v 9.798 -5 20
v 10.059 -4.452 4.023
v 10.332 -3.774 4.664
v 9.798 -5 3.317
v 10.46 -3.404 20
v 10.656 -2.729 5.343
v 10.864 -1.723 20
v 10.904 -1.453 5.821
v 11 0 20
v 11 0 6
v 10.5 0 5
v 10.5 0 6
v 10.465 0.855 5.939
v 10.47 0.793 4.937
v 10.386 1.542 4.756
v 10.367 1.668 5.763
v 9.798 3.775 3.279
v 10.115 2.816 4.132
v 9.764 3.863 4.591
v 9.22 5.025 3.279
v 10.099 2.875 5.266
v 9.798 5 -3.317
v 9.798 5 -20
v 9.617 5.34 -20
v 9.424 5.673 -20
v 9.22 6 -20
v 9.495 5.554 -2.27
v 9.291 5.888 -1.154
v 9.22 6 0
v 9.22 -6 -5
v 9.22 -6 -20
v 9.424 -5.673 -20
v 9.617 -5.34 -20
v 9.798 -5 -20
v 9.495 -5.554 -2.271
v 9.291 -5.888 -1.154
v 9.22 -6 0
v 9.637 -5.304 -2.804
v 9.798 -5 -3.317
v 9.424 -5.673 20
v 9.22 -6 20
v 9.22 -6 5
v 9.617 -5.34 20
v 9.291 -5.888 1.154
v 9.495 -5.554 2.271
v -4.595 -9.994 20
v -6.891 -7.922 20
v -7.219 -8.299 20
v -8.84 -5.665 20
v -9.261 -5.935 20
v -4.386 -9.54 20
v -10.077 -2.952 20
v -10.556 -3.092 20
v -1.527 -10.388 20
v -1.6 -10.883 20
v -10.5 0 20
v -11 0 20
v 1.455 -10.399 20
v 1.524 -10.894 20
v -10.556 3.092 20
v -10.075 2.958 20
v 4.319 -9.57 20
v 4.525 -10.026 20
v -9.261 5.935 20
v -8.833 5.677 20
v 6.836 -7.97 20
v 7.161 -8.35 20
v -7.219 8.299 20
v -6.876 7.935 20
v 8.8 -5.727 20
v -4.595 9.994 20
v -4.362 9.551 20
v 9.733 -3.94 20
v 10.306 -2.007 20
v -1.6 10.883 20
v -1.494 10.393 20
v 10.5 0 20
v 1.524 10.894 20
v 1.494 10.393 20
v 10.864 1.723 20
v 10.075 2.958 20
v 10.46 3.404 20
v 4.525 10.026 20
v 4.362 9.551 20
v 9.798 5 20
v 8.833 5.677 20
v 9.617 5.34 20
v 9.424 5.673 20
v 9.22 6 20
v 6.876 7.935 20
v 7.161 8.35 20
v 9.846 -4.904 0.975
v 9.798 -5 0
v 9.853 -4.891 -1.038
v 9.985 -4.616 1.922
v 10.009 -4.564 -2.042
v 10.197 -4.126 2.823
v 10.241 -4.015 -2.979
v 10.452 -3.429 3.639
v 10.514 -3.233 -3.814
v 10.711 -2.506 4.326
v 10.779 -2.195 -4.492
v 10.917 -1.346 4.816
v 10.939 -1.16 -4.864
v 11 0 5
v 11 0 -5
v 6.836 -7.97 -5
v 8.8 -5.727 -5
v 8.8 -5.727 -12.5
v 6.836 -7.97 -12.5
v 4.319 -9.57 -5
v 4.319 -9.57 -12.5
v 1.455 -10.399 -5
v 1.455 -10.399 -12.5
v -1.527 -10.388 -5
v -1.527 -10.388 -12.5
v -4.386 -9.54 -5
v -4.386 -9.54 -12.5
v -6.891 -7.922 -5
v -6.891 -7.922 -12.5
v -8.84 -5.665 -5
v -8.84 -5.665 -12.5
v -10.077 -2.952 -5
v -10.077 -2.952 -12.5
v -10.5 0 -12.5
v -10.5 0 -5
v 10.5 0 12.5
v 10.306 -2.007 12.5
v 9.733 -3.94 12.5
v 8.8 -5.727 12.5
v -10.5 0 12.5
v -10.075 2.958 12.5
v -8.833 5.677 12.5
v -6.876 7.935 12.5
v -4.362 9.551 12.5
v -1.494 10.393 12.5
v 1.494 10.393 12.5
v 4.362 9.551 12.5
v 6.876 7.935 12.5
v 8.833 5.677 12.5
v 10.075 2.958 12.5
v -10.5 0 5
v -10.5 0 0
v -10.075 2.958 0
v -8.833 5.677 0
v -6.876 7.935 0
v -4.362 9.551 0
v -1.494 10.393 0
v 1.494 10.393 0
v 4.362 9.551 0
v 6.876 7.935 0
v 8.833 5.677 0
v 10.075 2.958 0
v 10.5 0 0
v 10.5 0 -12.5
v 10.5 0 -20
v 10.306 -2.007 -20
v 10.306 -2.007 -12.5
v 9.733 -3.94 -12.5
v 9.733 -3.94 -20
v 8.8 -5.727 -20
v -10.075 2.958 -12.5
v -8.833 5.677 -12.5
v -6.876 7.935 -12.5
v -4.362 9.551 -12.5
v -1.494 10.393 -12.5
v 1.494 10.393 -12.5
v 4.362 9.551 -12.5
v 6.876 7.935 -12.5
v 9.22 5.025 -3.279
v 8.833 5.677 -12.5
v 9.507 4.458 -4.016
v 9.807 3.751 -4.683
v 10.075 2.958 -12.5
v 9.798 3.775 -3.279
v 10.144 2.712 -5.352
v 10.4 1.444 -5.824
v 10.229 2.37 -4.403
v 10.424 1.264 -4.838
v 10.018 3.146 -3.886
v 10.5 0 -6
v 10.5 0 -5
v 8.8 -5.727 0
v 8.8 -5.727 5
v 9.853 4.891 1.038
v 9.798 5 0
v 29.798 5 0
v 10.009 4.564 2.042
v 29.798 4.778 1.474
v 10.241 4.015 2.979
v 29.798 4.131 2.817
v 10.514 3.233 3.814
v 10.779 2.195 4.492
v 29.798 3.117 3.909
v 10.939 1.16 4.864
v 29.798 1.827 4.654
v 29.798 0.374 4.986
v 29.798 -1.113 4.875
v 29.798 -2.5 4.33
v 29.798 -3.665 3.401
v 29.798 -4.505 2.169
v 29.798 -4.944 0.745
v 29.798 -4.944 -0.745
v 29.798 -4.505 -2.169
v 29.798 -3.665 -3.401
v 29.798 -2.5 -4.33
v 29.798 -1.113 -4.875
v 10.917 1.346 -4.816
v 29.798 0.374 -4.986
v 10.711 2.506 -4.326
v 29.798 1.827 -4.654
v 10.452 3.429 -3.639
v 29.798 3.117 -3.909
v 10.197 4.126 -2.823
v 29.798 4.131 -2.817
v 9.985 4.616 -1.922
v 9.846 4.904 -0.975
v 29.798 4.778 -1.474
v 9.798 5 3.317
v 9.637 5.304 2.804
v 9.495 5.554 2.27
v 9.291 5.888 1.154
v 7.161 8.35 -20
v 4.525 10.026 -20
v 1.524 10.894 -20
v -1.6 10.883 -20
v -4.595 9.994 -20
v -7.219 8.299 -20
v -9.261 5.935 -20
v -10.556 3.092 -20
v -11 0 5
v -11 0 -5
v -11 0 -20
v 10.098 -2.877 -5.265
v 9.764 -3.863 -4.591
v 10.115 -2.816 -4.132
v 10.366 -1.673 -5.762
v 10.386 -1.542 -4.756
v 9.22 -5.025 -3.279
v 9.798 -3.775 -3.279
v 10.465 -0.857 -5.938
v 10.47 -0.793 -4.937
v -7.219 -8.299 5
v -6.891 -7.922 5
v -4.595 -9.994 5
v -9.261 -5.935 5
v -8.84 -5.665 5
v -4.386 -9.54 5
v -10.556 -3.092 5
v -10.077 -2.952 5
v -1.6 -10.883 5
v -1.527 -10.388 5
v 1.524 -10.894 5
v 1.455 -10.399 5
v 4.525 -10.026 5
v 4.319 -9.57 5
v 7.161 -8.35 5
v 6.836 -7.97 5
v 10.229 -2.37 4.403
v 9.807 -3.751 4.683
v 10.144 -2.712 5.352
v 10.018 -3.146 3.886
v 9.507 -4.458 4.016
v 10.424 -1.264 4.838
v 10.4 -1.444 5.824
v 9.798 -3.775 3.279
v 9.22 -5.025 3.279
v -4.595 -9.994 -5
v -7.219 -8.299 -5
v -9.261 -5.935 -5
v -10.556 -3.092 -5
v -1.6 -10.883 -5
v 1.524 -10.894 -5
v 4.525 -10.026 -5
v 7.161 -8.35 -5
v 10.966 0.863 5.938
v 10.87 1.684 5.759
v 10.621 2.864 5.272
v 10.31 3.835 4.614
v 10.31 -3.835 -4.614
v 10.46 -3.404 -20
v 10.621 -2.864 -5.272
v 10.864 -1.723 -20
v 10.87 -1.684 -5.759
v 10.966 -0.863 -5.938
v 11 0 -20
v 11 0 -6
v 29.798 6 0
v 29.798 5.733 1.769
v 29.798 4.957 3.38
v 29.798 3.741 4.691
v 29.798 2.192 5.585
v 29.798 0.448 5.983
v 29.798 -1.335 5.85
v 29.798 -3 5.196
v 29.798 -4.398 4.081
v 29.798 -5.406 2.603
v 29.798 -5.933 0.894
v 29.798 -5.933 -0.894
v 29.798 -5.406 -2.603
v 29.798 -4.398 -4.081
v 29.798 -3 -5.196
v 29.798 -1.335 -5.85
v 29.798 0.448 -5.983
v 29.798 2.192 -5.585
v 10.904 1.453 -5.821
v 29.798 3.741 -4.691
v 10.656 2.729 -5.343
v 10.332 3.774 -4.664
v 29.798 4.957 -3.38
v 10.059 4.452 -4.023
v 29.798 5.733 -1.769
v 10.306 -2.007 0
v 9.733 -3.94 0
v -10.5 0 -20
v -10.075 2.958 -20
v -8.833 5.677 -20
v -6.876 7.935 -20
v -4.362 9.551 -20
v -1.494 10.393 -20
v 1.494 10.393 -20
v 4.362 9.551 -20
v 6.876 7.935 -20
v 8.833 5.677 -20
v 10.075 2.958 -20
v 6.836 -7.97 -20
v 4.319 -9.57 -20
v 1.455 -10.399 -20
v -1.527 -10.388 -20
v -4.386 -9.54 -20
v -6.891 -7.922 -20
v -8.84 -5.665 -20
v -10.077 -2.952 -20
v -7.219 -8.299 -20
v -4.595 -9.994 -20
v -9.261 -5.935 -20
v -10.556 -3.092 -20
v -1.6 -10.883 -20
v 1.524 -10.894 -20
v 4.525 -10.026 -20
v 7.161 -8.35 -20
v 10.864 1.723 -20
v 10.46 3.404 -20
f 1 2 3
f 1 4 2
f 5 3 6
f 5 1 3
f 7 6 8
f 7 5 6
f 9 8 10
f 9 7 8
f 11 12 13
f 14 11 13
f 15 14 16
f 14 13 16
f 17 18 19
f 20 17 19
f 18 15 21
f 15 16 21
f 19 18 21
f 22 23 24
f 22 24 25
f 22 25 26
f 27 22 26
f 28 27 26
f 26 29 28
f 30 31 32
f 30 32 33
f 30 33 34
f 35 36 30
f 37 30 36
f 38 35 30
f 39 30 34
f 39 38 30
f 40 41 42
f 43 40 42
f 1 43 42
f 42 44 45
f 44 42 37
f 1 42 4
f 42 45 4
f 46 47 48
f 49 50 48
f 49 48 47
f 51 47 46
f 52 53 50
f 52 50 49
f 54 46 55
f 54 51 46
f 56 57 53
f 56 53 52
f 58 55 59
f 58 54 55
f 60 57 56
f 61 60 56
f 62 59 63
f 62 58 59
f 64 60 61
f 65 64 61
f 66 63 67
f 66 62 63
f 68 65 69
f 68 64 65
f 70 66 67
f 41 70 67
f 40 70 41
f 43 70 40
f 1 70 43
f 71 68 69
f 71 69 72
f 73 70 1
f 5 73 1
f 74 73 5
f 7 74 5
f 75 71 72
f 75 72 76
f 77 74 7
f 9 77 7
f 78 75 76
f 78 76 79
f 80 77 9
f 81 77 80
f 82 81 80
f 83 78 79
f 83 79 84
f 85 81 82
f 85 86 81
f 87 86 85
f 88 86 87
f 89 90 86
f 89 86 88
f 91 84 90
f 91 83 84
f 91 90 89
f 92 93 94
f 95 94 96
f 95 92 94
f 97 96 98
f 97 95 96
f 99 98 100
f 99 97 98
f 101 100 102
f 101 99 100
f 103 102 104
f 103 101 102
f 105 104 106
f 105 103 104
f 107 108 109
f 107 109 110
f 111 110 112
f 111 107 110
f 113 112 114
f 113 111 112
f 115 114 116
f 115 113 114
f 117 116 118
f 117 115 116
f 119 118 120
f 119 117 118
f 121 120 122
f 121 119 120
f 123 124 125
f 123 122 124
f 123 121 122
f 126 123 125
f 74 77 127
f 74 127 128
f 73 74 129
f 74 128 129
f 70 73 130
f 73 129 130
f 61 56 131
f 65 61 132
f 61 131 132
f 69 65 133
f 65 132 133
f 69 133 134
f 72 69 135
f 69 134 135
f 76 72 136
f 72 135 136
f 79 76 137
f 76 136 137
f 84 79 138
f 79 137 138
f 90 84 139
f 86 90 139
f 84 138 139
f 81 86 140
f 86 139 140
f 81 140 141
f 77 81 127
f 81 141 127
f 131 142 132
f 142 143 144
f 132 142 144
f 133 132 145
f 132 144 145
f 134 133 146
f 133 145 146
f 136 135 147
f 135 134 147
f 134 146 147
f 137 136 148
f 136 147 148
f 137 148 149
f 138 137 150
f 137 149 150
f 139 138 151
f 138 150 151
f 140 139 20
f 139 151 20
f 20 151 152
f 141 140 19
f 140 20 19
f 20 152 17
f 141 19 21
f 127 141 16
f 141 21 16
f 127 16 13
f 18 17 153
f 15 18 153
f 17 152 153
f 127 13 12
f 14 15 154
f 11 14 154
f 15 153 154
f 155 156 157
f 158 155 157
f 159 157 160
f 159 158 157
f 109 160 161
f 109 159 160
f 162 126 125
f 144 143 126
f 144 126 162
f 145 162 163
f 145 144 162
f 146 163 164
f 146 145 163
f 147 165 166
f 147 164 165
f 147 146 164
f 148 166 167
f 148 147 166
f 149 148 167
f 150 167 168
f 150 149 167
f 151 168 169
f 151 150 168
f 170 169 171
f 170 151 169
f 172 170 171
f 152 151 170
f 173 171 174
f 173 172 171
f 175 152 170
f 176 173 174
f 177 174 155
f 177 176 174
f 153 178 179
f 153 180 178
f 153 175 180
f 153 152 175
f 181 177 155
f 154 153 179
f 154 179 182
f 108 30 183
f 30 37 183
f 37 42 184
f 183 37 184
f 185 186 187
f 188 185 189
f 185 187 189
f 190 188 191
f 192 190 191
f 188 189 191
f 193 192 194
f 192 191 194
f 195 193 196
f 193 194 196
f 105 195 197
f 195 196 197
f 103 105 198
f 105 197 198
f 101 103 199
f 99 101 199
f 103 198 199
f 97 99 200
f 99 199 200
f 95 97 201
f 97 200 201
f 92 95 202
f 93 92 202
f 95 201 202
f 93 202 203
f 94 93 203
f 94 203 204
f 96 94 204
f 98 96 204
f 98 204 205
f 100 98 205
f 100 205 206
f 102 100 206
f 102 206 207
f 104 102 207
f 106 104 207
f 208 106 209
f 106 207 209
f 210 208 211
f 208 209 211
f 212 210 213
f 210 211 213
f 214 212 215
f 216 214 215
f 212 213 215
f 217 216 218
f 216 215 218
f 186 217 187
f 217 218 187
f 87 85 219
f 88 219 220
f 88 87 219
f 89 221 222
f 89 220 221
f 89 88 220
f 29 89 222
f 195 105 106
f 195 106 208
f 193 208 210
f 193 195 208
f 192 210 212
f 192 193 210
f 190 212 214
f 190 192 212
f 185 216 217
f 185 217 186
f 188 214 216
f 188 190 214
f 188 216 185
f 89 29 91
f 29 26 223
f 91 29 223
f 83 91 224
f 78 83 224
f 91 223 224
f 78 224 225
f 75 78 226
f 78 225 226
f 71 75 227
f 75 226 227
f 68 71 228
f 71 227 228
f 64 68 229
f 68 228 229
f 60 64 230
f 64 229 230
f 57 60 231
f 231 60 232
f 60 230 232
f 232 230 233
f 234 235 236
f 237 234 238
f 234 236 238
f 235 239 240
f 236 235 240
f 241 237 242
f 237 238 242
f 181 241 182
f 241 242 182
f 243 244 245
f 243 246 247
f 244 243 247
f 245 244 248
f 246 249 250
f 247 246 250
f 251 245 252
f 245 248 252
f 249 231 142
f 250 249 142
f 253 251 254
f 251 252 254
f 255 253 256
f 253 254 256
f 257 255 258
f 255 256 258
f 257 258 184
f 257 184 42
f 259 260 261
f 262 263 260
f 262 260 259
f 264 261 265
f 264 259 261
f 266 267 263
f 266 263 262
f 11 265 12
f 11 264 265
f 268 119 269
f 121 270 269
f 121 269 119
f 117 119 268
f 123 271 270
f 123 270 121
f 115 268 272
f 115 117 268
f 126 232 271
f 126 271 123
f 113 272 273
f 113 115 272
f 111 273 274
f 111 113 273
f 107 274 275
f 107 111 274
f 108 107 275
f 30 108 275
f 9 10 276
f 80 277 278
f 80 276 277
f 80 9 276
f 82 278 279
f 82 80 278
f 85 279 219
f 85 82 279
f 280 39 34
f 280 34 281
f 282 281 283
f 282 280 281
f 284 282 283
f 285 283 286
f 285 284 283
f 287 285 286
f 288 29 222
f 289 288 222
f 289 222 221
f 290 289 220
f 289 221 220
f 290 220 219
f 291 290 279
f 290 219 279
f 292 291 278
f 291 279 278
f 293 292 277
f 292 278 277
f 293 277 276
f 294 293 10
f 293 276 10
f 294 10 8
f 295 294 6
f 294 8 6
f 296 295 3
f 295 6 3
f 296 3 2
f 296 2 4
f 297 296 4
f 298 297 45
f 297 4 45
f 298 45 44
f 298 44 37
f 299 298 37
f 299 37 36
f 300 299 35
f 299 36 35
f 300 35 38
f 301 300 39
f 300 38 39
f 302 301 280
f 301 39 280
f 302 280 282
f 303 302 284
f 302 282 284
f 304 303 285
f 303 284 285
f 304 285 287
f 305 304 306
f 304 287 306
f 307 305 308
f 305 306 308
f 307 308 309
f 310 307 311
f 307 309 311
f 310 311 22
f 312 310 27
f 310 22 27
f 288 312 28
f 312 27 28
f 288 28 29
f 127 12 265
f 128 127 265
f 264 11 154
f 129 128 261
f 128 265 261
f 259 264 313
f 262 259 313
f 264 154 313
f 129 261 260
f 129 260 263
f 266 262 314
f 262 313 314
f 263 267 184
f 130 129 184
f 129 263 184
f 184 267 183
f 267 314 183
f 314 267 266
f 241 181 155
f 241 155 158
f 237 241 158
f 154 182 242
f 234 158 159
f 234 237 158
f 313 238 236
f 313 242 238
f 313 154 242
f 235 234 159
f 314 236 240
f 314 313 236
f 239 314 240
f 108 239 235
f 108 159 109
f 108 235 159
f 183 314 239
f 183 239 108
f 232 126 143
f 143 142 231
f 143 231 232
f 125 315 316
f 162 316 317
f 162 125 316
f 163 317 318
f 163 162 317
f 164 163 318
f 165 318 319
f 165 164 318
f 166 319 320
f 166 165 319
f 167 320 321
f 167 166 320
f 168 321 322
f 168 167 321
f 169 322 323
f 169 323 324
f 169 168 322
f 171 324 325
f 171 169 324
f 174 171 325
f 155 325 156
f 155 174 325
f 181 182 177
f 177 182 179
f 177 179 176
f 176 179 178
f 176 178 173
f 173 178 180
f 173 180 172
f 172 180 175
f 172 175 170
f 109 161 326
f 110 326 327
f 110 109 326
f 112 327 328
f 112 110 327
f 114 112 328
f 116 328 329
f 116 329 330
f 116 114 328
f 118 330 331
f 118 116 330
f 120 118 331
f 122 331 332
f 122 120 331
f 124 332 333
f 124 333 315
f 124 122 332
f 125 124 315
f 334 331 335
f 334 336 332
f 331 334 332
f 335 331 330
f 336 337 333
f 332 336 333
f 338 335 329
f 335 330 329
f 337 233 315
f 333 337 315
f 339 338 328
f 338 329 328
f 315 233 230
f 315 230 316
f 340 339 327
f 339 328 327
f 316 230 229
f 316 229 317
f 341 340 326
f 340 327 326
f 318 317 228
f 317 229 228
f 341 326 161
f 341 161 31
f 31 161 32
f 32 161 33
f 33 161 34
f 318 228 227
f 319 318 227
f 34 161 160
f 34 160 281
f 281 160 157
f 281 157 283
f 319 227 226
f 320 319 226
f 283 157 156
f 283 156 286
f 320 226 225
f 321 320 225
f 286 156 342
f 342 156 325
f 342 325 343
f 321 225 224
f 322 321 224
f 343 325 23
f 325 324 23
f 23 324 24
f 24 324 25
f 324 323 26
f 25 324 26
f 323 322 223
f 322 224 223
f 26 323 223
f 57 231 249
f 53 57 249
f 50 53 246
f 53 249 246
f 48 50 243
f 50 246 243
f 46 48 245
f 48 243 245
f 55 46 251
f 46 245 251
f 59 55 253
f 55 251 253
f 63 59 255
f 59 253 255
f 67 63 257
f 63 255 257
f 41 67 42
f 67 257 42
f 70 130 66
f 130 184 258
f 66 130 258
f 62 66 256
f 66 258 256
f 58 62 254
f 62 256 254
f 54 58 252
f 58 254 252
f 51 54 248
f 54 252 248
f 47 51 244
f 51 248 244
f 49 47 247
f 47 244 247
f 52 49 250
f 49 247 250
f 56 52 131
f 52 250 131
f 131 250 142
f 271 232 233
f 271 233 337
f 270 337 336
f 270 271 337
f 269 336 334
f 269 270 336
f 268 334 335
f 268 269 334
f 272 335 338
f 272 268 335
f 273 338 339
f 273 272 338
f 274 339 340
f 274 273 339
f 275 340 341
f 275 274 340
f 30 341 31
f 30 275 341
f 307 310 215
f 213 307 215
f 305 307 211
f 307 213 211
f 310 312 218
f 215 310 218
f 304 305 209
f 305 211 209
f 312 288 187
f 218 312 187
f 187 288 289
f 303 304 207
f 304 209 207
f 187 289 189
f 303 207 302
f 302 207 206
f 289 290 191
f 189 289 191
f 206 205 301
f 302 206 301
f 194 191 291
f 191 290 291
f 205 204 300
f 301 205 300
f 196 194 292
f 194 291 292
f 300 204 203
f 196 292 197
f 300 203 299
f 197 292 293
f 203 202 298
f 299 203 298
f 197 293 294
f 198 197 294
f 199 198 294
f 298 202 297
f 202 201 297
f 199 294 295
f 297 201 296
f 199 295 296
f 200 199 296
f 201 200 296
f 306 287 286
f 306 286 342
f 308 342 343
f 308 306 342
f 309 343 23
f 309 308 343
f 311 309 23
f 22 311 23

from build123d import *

# Parameters (mm, degrees)
F1_DEPTH = 20
F2_DEPTH = 5
F4_DEPTH = 12.5


with BuildPart() as f1:
    # F0 (on Top) → F1 (new body, symmetric)
    with BuildSketch(Plane.XY):
        with BuildLine():
            Line((10.5, 0), (11, 0))
            ThreePointArc((11, 0), (10.695268783, 2.5712303784), (9.7979589711, 5))
            ThreePointArc((9.7979589711, 5), (9.5218884242, 5.5075984637), (9.2195444573, 6))
            ThreePointArc((9.2195444573, 6), (-3.129297922, 10.5454964091), (-11, 0))
            Line((-11, 0), (-10.5, 0))
            ThreePointArc((-10.5, 0), (0, 10.5), (10.5, 0))
        make_face()
        with BuildLine():
            ThreePointArc((-11, 0), (-3.129297922, -10.5454964091), (9.2195444573, -6))
            Line((9.2195444573, -6), (8.8004742547, -5.7272727273))
            ThreePointArc((8.8004742547, -5.7272727273), (-2.9870571074, -10.0661556633), (-10.5, 0))
            Line((-10.5, 0), (-11, 0))
        make_face()
        with BuildLine():
            ThreePointArc((9.7979589711, -5), (10.695268783, -2.5712303784), (11, 0))
            Line((11, 0), (10.5, 0))
            ThreePointArc((10.5, 0), (10.0661556633, -2.9870571074), (8.8004742547, -5.7272727273))
            Line((8.8004742547, -5.7272727273), (9.2195444573, -6))
            ThreePointArc((9.2195444573, -6), (9.5218884242, -5.5075984637), (9.7979589711, -5))
        make_face()
    extrude(amount=F1_DEPTH, both=True)

    # F0 (on Top) → F2 (cut, symmetric)
    with BuildSketch(Plane.XY):
        with BuildLine():
            Line((0, 0), (-10.5, 0))
            ThreePointArc((-10.5, 0), (-2.9870571074, -10.0661556633), (8.8004742547, -5.7272727273))
            Line((8.8004742547, -5.7272727273), (0, 0))
        make_face()
        with BuildLine():
            Line((11, -6), (9.2195444573, -6))
            ThreePointArc((9.2195444573, -6), (-3.129297922, -10.5454964091), (-11, 0))
            Line((-11, 0), (-11, -15))
            Line((-11, -15), (11, -15))
            Line((11, -15), (11, -6))
        make_face()
        with BuildLine():
            ThreePointArc((-11, 0), (-3.129297922, -10.5454964091), (9.2195444573, -6))
            Line((9.2195444573, -6), (8.8004742547, -5.7272727273))
            ThreePointArc((8.8004742547, -5.7272727273), (-2.9870571074, -10.0661556633), (-10.5, 0))
            Line((-10.5, 0), (-11, 0))
        make_face()
    extrude(amount=F2_DEPTH, both=True, mode=Mode.SUBTRACT)

    # F0 (on Top) → F3 (revolve)
    with BuildSketch(Plane.XY):
        with BuildLine():
            ThreePointArc((9.2195444573, 6), (9.5218884242, 5.5075984637), (9.7979589711, 5))
            Line((9.7979589711, 5), (29.7979589711, 5))
            Line((29.7979589711, 5), (29.7979589711, 6))
            Line((29.7979589711, 6), (9.2195444573, 6))
        make_face()
    revolve(axis=Axis((0, 0, 0), (1, 0, 0)))

    # F0 (on Top) → F4 (cut, symmetric)
    with BuildSketch(Plane.XY):
        with BuildLine():
            Line((0, 0), (10.5, 0))
            ThreePointArc((10.5, 0), (0, 10.5), (-10.5, 0))
            Line((-10.5, 0), (0, 0))
        make_face()
        with BuildLine():
            Line((0, 0), (-10.5, 0))
            ThreePointArc((-10.5, 0), (-2.9870571074, -10.0661556633), (8.8004742547, -5.7272727273))
            Line((8.8004742547, -5.7272727273), (0, 0))
        make_face()
        with BuildLine():
            ThreePointArc((8.8004742547, -5.7272727273), (10.0661556633, -2.9870571074), (10.5, 0))
            Line((10.5, 0), (0, 0))
            Line((0, 0), (8.8004742547, -5.7272727273))
        make_face()
    extrude(amount=F4_DEPTH, both=True, mode=Mode.SUBTRACT)


solid = f1.part
